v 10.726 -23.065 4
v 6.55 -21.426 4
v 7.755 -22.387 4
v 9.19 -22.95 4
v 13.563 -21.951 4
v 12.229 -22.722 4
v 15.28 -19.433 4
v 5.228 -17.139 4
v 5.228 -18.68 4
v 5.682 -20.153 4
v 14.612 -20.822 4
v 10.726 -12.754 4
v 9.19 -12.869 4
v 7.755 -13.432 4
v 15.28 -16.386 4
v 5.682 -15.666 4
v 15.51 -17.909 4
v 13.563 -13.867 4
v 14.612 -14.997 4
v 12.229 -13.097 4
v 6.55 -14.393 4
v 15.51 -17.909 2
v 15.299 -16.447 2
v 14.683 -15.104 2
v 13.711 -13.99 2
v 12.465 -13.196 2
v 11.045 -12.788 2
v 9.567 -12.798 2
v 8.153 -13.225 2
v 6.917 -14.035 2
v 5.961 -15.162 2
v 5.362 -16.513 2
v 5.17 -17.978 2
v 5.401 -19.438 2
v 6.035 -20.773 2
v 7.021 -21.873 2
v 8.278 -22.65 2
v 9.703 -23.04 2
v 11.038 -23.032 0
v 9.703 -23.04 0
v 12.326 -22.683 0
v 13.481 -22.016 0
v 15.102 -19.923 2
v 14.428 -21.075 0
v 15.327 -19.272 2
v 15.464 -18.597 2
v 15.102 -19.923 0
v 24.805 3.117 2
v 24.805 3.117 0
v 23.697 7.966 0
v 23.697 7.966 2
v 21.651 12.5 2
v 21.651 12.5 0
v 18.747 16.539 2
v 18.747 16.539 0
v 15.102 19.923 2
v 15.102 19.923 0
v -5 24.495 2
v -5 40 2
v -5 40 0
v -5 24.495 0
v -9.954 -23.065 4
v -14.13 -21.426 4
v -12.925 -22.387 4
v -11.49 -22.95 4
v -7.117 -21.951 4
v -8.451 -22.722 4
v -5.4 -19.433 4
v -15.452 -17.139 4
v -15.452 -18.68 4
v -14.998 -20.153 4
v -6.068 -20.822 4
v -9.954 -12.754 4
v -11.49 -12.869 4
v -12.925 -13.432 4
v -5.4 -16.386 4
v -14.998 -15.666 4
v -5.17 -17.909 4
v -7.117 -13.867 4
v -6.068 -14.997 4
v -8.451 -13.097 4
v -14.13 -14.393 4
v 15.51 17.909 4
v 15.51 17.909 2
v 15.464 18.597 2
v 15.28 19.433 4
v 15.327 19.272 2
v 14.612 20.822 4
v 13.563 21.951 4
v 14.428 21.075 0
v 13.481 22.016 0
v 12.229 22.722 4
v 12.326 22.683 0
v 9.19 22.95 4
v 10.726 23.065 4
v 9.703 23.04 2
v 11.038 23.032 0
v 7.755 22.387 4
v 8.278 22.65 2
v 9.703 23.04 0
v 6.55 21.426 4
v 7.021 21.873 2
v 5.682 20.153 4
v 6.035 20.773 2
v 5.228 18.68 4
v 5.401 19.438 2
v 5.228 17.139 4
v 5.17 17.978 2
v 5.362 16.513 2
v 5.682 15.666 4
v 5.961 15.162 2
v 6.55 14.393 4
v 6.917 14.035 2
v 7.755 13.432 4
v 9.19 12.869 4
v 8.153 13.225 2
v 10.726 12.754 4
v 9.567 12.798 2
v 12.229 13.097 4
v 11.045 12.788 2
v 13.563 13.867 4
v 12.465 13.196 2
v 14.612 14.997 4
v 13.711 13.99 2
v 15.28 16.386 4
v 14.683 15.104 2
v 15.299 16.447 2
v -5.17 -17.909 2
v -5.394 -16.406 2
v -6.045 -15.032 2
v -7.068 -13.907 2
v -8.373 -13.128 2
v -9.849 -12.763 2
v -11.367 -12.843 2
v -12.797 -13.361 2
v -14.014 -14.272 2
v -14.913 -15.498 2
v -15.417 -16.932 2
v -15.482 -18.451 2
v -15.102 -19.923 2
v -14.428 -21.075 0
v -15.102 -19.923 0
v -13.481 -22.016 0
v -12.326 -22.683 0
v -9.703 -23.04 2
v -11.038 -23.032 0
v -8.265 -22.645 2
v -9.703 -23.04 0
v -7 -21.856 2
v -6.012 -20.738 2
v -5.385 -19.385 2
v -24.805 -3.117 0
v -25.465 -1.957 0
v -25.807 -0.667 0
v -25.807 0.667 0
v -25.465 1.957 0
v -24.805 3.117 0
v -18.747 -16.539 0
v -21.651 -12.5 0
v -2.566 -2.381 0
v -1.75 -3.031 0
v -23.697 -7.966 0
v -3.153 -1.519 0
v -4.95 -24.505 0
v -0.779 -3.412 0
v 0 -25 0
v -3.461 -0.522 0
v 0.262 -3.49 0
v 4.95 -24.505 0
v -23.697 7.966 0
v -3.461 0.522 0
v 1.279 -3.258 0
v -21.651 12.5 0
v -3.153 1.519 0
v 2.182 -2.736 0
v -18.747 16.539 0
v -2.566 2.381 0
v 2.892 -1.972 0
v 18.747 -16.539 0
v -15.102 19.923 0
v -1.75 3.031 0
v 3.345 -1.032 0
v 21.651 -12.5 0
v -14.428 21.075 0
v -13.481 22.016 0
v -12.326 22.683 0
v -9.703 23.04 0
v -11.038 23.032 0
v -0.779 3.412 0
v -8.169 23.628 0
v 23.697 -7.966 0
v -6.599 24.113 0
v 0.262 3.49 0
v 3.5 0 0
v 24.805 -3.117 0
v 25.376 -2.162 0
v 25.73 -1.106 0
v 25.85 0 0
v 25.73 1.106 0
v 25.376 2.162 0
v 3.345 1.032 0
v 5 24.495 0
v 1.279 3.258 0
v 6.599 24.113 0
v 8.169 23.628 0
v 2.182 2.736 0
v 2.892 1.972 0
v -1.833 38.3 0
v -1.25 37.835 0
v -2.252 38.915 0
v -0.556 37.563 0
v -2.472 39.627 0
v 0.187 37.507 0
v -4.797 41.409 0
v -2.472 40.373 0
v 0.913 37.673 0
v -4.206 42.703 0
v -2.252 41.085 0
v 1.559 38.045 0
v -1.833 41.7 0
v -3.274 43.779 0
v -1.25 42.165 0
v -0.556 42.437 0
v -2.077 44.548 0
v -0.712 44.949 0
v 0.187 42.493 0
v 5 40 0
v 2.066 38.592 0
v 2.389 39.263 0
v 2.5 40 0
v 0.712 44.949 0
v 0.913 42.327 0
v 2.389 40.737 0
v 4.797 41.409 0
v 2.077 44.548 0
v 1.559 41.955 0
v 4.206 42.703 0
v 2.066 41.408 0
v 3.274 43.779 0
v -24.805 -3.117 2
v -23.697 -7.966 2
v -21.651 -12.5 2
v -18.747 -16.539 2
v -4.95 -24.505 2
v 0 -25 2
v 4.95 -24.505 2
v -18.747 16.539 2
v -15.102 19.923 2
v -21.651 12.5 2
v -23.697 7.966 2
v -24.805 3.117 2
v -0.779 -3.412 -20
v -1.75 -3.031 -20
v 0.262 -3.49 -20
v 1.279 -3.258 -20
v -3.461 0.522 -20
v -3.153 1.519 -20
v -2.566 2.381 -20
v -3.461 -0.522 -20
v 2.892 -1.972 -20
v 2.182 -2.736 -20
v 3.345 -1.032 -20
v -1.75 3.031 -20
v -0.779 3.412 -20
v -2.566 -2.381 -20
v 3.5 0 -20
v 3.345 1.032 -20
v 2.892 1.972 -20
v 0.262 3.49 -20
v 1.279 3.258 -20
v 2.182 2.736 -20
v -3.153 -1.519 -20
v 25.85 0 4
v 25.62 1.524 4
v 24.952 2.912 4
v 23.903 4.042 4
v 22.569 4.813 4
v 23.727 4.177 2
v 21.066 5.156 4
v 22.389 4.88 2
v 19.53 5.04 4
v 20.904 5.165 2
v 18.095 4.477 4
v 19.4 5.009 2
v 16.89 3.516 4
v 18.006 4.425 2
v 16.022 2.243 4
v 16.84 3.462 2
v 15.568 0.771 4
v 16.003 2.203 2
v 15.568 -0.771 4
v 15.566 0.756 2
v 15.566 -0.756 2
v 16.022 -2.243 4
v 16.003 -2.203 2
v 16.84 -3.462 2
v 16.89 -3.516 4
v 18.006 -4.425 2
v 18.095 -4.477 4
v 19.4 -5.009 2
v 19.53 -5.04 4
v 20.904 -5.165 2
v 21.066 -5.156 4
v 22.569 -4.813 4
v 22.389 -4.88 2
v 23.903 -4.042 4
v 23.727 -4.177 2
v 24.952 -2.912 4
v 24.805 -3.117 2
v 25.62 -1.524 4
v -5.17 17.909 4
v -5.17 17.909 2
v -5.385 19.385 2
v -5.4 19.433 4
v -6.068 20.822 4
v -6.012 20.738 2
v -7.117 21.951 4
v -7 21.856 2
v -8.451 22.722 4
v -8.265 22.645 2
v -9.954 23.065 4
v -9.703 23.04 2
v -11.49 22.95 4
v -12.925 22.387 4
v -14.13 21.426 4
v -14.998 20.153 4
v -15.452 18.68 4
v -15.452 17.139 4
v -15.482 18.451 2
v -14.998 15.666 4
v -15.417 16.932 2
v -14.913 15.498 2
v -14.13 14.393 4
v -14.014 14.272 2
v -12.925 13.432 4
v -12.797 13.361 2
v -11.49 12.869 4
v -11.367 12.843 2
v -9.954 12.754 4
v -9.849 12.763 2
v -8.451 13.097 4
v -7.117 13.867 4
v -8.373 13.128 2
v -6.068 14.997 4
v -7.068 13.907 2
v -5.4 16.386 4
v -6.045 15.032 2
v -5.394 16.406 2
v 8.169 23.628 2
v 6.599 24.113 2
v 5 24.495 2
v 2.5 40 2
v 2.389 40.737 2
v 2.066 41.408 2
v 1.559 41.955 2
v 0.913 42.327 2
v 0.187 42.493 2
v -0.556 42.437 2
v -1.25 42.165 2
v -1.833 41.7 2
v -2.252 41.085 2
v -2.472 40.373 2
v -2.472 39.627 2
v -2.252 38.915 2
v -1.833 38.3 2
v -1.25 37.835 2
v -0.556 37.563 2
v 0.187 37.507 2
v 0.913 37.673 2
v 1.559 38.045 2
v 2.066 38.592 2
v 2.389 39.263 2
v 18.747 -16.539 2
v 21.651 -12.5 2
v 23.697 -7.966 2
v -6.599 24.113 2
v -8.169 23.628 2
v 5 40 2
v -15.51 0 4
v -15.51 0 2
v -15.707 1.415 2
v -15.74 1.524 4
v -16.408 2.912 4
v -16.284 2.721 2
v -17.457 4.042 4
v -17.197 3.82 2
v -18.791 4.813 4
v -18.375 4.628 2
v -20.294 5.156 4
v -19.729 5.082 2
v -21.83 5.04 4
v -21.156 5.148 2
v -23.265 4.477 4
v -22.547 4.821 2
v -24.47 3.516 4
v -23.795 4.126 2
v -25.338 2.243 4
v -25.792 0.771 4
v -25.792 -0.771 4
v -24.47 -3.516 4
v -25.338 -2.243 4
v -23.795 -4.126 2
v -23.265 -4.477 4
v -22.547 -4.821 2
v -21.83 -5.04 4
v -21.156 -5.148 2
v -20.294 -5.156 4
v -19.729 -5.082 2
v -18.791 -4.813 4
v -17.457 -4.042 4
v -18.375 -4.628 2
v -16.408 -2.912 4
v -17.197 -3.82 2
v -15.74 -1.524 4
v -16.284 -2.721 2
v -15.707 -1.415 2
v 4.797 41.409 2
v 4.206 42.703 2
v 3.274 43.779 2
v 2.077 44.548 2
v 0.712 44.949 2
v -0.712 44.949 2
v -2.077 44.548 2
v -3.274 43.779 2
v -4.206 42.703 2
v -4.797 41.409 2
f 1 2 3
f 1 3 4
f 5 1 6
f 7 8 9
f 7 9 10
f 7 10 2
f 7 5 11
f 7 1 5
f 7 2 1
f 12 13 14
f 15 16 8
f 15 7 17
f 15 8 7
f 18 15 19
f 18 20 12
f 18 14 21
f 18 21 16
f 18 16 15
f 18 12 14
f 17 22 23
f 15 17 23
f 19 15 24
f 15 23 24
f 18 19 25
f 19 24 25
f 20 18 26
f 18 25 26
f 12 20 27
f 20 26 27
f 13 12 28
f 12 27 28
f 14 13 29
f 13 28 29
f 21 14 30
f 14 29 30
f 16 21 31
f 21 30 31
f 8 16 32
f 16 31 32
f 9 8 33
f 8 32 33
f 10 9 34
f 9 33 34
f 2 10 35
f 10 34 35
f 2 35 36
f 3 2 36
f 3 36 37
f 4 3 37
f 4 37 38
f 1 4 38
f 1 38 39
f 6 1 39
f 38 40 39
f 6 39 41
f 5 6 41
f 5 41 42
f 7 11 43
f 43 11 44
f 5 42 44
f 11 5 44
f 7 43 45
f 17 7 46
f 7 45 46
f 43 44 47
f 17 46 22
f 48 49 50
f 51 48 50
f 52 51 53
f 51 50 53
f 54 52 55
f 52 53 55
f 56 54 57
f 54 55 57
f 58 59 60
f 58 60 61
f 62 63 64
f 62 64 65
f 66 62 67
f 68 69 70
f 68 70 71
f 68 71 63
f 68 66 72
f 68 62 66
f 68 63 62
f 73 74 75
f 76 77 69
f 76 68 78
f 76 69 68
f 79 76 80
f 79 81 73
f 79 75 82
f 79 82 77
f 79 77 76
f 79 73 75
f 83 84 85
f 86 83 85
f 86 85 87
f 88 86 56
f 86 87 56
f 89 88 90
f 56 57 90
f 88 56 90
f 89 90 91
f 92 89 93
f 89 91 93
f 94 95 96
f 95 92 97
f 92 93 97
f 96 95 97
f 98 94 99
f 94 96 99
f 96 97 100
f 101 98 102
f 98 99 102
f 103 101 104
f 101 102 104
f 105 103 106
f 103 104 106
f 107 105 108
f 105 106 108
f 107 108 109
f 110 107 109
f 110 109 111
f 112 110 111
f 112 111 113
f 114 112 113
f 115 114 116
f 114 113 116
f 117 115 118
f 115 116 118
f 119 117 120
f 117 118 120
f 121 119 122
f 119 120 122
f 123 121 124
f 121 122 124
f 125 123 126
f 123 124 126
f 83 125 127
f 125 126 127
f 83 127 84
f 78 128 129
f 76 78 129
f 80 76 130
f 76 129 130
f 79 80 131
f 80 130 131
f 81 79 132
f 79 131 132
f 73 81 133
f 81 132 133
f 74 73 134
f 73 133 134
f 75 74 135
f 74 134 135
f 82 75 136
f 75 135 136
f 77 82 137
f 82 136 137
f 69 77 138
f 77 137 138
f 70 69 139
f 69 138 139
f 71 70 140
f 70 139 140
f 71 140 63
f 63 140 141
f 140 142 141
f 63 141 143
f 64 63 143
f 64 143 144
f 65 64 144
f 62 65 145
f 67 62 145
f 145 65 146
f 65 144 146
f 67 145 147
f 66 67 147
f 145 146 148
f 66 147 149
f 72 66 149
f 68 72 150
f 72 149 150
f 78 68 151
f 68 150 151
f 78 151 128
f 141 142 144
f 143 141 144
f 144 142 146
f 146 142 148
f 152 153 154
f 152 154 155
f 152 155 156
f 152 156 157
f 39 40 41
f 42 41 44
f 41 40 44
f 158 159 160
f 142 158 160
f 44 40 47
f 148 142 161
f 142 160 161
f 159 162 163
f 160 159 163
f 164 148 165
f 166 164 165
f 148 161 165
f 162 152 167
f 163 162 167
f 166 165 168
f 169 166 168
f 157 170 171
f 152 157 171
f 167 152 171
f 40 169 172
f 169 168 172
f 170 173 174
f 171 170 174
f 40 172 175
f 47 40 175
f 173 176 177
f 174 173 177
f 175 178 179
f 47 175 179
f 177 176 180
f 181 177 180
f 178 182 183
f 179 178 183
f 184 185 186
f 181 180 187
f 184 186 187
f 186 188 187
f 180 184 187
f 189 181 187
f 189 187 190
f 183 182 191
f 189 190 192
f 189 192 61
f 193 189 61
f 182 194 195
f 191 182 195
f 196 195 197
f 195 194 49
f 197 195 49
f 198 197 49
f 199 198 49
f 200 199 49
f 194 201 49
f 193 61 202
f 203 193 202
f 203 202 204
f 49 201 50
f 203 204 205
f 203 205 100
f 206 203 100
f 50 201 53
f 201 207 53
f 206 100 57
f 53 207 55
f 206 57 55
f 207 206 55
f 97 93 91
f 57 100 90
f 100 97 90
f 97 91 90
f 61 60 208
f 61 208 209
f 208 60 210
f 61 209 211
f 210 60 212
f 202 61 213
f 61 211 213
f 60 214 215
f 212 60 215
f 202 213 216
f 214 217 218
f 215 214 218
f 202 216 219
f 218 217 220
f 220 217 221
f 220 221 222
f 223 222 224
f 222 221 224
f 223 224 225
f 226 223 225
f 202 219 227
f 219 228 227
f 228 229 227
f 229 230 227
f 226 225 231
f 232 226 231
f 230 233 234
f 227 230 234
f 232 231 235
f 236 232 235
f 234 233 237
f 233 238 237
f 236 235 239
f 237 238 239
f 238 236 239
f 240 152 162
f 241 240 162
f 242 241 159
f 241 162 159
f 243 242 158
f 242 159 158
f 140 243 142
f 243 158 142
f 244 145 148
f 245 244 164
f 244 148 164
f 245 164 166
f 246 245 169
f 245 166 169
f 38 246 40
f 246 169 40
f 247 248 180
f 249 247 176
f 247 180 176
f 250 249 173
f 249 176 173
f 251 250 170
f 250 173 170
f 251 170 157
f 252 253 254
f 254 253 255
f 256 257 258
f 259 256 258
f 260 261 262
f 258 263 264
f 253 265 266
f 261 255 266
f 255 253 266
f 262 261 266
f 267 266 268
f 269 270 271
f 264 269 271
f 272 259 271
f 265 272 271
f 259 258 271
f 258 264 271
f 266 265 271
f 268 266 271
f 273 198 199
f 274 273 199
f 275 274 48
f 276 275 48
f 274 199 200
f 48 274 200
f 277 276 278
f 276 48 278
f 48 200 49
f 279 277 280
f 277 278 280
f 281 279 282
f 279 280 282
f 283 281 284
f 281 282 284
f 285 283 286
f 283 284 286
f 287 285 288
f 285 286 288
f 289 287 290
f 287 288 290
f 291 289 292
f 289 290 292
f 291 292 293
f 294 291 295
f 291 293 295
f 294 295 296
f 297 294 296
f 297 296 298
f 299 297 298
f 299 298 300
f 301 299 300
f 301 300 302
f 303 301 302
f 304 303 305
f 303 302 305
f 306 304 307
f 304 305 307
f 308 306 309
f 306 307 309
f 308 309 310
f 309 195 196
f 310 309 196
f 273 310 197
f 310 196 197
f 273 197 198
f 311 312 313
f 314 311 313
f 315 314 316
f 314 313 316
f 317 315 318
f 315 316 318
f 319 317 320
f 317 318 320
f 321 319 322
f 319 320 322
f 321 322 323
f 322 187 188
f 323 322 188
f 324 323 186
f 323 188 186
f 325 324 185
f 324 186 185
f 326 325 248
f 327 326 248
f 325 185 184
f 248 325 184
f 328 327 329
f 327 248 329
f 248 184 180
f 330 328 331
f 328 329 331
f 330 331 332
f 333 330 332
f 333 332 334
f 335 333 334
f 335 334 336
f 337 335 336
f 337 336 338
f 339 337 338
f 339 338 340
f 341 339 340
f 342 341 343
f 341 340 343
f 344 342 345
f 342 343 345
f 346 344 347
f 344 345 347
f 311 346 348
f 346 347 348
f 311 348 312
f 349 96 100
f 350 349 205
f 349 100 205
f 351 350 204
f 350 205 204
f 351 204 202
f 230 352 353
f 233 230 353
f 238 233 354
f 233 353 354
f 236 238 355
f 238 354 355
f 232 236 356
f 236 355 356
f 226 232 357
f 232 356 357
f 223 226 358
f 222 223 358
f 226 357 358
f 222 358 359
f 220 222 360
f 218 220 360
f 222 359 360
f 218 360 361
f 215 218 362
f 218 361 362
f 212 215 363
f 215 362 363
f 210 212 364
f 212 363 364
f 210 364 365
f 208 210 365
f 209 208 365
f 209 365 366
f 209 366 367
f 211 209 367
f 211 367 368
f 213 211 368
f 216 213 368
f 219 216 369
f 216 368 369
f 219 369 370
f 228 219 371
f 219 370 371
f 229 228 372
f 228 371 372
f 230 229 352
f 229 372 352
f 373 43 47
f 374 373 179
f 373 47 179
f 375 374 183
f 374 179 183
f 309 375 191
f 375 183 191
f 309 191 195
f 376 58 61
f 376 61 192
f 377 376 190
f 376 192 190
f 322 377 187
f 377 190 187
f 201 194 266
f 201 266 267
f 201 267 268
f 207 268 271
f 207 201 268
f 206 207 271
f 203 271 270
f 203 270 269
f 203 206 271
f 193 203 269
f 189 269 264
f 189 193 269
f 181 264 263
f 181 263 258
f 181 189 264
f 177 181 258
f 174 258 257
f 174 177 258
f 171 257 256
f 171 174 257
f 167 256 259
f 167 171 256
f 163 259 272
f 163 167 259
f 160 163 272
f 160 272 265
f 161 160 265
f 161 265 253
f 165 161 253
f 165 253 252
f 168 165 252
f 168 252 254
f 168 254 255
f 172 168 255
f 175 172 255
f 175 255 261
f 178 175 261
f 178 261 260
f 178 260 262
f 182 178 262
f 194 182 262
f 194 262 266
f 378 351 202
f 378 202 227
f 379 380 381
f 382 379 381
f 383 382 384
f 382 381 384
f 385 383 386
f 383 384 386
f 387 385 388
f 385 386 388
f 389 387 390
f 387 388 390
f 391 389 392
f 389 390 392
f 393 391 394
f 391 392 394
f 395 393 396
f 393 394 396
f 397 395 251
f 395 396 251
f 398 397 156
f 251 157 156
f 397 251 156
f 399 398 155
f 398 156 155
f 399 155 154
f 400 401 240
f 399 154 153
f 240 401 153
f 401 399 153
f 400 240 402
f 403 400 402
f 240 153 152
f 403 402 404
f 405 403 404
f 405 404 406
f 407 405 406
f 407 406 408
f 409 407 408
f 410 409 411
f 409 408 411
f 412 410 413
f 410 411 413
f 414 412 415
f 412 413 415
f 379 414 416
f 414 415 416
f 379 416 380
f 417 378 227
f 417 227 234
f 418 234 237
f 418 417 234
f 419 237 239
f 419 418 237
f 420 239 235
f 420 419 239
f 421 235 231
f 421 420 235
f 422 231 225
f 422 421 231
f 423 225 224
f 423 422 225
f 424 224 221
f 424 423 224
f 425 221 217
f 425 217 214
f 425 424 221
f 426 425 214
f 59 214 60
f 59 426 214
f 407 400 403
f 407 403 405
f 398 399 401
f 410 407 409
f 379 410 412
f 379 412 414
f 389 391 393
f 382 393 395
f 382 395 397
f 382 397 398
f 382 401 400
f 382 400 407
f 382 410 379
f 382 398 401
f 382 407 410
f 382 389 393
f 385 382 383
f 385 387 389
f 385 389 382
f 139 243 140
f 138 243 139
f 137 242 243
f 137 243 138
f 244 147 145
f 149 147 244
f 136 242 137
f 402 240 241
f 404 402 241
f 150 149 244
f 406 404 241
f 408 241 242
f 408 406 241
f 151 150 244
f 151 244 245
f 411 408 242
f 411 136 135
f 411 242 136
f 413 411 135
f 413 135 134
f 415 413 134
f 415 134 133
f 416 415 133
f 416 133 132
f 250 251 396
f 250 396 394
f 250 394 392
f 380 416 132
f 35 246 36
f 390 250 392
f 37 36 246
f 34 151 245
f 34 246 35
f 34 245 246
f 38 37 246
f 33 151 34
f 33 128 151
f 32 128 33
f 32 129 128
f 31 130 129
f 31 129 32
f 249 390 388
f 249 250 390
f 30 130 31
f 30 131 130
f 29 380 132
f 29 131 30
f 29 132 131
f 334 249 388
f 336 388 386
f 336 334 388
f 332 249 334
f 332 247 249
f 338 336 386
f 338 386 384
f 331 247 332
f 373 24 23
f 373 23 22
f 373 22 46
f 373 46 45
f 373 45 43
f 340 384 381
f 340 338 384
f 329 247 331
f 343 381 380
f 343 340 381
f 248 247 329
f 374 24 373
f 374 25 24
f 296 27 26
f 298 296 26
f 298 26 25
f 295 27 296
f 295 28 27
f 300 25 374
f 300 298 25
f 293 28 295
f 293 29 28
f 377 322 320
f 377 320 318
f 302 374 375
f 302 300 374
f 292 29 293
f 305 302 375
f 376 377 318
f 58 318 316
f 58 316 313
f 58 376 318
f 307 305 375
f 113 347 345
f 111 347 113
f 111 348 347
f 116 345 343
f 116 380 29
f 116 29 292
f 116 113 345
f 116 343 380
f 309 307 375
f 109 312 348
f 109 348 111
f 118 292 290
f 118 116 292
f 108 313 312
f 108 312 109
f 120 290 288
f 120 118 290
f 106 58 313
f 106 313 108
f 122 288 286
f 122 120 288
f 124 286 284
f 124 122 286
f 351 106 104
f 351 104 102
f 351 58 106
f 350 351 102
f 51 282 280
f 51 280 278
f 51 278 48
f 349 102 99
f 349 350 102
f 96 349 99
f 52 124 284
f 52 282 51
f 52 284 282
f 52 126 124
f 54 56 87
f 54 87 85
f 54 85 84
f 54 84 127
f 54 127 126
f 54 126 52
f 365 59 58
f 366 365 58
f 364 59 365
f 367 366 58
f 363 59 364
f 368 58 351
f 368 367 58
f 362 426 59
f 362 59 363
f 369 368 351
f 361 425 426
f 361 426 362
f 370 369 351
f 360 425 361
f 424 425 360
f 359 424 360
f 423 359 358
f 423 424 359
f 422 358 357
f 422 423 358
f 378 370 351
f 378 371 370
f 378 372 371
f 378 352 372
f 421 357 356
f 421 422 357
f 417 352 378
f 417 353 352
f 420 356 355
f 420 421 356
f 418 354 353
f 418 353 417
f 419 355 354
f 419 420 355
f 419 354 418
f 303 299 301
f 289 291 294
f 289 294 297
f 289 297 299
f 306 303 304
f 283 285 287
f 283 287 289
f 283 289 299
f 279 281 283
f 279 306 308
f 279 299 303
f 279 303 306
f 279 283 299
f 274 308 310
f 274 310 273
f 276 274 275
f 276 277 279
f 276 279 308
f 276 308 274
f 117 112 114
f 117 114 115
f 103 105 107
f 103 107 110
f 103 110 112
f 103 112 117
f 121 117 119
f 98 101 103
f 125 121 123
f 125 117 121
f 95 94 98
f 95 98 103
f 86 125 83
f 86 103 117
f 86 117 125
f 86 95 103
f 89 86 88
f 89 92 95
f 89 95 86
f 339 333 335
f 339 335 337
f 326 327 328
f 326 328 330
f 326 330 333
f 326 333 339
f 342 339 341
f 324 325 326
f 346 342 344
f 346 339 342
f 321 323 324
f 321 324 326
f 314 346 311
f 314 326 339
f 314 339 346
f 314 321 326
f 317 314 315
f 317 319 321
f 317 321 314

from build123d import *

# Parameters (mm, degrees)
F0_R     = 3.5
F1_DEPTH = 20
F2_R     = 25
F3_DEPTH = 2
F4_R     = 5.17
F5_DEPTH = 4
F6_R     = 2.5
F7_DEPTH = 2


with BuildPart() as f1:
    # F0 (on Top) → F1 (new body)
    with BuildSketch(Plane.XY):
        Circle(F0_R)
    extrude(amount=-F1_DEPTH)

    # F2 (on Top) → F3 (join)
    with BuildSketch(Plane.XY):
        Circle(F2_R)
    extrude(amount=F3_DEPTH)

    # F4 (on Top) → F5 (join)
    with BuildSketch(Plane.XY):
        with Locations((-20.68, 0)):
            Circle(F4_R)
        with Locations((-10.34, -17.909405)):
            Circle(F4_R)
        with Locations((10.34, -17.909405)):
            Circle(F4_R)
        with Locations((20.68, 0)):
            Circle(F4_R)
        with Locations((10.34, 17.909405)):
            Circle(F4_R)
        with Locations((-10.34, 17.909405)):
            Circle(F4_R)
    extrude(amount=F5_DEPTH)

    # F6 (on face) → F7 (join)
    with BuildSketch(Plane.XY.offset(2)):
        with BuildLine():
            Line((-5, 40), (-5, 0))
            Line((-5, 0), (5, 0))
            Line((5, 0), (5, 40))
            ThreePointArc((5, 40), (0, 45), (-5, 40))
        make_face()
        with Locations((0, 40)):
            Circle(F6_R, mode=Mode.SUBTRACT)
    extrude(amount=-F7_DEPTH)


solid = f1.part
